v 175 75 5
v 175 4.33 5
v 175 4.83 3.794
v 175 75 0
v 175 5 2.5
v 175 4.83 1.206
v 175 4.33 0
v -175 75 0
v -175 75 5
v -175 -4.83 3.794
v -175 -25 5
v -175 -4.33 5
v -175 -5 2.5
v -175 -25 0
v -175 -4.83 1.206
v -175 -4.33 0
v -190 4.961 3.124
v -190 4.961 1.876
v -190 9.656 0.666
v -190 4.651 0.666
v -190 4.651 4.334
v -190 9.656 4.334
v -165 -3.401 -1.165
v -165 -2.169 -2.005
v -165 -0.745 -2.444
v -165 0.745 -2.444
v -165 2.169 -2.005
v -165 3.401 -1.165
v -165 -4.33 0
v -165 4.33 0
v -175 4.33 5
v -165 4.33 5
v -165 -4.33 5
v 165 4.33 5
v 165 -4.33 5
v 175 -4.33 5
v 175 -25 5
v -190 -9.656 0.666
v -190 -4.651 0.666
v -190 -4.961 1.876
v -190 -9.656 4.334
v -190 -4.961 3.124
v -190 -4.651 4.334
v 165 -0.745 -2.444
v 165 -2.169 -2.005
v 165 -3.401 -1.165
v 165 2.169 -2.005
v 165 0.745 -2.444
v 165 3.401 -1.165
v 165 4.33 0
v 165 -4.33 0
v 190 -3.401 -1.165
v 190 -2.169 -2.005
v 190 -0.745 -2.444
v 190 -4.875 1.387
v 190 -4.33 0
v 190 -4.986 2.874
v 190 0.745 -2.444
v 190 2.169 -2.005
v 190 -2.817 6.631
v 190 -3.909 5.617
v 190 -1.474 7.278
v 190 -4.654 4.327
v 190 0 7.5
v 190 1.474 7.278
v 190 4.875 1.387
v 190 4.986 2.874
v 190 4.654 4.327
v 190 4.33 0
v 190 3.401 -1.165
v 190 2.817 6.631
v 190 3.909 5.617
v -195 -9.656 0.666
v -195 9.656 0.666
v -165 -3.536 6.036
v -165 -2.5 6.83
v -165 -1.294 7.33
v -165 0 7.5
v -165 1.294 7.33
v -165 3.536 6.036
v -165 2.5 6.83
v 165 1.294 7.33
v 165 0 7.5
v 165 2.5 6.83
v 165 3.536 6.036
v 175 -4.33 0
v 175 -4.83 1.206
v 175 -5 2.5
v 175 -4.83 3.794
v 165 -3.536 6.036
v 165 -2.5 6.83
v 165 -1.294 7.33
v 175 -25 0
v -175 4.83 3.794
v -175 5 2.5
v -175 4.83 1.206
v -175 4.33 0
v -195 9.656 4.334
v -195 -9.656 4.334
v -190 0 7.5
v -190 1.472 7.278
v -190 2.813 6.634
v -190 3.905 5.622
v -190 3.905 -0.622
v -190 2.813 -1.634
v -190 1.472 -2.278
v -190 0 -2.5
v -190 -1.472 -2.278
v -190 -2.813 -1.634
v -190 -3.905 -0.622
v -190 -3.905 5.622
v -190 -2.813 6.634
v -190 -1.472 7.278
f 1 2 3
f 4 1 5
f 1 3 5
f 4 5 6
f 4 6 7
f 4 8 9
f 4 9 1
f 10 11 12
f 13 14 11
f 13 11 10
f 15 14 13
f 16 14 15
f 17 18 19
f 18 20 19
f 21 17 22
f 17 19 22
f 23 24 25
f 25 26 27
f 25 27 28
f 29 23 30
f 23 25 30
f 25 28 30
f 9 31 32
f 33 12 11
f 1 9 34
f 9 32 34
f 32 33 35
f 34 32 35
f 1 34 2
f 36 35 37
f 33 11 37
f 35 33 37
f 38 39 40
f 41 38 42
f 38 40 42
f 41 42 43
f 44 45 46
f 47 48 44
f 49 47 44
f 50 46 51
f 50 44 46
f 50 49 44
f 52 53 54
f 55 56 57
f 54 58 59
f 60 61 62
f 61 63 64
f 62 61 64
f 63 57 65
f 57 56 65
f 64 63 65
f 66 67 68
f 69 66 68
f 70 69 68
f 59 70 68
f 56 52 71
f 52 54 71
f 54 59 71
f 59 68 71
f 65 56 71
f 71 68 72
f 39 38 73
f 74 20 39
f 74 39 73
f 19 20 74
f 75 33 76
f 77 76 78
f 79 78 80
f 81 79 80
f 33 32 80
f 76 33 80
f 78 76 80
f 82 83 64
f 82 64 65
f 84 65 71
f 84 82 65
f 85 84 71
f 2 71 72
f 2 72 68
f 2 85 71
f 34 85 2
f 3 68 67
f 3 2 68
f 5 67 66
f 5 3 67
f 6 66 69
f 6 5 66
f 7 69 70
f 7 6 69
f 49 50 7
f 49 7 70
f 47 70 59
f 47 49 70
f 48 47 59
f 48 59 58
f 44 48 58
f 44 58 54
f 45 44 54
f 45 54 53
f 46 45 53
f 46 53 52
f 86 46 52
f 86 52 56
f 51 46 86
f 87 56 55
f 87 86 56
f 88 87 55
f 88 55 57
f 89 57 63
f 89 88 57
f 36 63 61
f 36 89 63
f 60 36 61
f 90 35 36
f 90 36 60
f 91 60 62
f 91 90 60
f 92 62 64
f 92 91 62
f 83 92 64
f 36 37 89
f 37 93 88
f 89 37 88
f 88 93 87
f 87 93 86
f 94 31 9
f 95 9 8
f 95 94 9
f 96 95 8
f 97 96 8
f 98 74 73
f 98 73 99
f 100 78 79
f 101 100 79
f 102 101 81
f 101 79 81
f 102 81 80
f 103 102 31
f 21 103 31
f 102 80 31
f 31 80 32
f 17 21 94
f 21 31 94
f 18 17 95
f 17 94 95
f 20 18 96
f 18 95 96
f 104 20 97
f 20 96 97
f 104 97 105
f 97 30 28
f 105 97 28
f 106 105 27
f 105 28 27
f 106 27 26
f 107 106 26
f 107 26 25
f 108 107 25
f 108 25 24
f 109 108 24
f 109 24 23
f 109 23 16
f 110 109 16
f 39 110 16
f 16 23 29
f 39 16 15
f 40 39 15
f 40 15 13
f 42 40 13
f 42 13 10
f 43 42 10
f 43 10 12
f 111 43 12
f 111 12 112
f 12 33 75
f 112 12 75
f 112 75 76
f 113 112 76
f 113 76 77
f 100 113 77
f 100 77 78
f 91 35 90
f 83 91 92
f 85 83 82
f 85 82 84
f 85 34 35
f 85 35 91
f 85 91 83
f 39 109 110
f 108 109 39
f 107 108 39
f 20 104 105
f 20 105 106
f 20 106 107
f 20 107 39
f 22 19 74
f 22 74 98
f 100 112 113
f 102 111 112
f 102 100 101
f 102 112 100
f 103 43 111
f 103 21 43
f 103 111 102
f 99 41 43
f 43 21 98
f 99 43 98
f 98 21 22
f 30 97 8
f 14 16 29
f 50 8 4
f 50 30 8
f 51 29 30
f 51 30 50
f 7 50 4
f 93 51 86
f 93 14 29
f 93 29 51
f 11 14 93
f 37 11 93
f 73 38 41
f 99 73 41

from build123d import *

# Parameters (mm, degrees)
SKETCH1_W           = 350
SKETCH1_H           = 50
BOSS_EXTRUDE1_DEPTH = 5
BOSS_EXTRUDE2_START = -10
SKETCH2_R           = 5
BOSS_EXTRUDE2_DEPTH = 25
SKETCH4_W           = 350
SKETCH4_H           = 5
BOSS_EXTRUDE4_DEPTH = 50
SKETCH5_W           = 3.668837662
SKETCH5_H           = 19.311798598
BOSS_EXTRUDE5_DEPTH = 5


with BuildPart() as part:
    # Sketch1 → Boss-Extrude1 (new body)
    with BuildSketch(Plane.XY):
        Rectangle(SKETCH1_W, SKETCH1_H)
    extrude(amount=BOSS_EXTRUDE1_DEPTH)

    # Sketch2 → Boss-Extrude2 (add)
    with BuildSketch(Plane.ZY.offset(175).offset(BOSS_EXTRUDE2_START)):
        with Locations((2.5, 0)):
            Circle(SKETCH2_R)
    boss_extrude2 = extrude(amount=BOSS_EXTRUDE2_DEPTH)

    # Mirror1: Boss-Extrude2 across plane
    add(boss_extrude2.mirror(Plane(origin=(0, 0, 0), x_dir=(0, 0, 1), z_dir=(1, 0, 0))))

    # Sketch4 → Boss-Extrude4 (add)
    with BuildSketch(Plane(origin=(0, 25, 0), x_dir=(1, 0, 0), z_dir=(0, 1, 0))):
        with Locations((0, -2.5)):
            Rectangle(SKETCH4_W, SKETCH4_H)
    extrude(amount=BOSS_EXTRUDE4_DEPTH)

    # Sketch5 → Boss-Extrude5 (add)
    with BuildSketch(Plane.ZY.offset(190)):
        with Locations((2.5, 0)):
            Rectangle(SKETCH5_W, SKETCH5_H)
    extrude(amount=BOSS_EXTRUDE5_DEPTH)


solid = part.part
